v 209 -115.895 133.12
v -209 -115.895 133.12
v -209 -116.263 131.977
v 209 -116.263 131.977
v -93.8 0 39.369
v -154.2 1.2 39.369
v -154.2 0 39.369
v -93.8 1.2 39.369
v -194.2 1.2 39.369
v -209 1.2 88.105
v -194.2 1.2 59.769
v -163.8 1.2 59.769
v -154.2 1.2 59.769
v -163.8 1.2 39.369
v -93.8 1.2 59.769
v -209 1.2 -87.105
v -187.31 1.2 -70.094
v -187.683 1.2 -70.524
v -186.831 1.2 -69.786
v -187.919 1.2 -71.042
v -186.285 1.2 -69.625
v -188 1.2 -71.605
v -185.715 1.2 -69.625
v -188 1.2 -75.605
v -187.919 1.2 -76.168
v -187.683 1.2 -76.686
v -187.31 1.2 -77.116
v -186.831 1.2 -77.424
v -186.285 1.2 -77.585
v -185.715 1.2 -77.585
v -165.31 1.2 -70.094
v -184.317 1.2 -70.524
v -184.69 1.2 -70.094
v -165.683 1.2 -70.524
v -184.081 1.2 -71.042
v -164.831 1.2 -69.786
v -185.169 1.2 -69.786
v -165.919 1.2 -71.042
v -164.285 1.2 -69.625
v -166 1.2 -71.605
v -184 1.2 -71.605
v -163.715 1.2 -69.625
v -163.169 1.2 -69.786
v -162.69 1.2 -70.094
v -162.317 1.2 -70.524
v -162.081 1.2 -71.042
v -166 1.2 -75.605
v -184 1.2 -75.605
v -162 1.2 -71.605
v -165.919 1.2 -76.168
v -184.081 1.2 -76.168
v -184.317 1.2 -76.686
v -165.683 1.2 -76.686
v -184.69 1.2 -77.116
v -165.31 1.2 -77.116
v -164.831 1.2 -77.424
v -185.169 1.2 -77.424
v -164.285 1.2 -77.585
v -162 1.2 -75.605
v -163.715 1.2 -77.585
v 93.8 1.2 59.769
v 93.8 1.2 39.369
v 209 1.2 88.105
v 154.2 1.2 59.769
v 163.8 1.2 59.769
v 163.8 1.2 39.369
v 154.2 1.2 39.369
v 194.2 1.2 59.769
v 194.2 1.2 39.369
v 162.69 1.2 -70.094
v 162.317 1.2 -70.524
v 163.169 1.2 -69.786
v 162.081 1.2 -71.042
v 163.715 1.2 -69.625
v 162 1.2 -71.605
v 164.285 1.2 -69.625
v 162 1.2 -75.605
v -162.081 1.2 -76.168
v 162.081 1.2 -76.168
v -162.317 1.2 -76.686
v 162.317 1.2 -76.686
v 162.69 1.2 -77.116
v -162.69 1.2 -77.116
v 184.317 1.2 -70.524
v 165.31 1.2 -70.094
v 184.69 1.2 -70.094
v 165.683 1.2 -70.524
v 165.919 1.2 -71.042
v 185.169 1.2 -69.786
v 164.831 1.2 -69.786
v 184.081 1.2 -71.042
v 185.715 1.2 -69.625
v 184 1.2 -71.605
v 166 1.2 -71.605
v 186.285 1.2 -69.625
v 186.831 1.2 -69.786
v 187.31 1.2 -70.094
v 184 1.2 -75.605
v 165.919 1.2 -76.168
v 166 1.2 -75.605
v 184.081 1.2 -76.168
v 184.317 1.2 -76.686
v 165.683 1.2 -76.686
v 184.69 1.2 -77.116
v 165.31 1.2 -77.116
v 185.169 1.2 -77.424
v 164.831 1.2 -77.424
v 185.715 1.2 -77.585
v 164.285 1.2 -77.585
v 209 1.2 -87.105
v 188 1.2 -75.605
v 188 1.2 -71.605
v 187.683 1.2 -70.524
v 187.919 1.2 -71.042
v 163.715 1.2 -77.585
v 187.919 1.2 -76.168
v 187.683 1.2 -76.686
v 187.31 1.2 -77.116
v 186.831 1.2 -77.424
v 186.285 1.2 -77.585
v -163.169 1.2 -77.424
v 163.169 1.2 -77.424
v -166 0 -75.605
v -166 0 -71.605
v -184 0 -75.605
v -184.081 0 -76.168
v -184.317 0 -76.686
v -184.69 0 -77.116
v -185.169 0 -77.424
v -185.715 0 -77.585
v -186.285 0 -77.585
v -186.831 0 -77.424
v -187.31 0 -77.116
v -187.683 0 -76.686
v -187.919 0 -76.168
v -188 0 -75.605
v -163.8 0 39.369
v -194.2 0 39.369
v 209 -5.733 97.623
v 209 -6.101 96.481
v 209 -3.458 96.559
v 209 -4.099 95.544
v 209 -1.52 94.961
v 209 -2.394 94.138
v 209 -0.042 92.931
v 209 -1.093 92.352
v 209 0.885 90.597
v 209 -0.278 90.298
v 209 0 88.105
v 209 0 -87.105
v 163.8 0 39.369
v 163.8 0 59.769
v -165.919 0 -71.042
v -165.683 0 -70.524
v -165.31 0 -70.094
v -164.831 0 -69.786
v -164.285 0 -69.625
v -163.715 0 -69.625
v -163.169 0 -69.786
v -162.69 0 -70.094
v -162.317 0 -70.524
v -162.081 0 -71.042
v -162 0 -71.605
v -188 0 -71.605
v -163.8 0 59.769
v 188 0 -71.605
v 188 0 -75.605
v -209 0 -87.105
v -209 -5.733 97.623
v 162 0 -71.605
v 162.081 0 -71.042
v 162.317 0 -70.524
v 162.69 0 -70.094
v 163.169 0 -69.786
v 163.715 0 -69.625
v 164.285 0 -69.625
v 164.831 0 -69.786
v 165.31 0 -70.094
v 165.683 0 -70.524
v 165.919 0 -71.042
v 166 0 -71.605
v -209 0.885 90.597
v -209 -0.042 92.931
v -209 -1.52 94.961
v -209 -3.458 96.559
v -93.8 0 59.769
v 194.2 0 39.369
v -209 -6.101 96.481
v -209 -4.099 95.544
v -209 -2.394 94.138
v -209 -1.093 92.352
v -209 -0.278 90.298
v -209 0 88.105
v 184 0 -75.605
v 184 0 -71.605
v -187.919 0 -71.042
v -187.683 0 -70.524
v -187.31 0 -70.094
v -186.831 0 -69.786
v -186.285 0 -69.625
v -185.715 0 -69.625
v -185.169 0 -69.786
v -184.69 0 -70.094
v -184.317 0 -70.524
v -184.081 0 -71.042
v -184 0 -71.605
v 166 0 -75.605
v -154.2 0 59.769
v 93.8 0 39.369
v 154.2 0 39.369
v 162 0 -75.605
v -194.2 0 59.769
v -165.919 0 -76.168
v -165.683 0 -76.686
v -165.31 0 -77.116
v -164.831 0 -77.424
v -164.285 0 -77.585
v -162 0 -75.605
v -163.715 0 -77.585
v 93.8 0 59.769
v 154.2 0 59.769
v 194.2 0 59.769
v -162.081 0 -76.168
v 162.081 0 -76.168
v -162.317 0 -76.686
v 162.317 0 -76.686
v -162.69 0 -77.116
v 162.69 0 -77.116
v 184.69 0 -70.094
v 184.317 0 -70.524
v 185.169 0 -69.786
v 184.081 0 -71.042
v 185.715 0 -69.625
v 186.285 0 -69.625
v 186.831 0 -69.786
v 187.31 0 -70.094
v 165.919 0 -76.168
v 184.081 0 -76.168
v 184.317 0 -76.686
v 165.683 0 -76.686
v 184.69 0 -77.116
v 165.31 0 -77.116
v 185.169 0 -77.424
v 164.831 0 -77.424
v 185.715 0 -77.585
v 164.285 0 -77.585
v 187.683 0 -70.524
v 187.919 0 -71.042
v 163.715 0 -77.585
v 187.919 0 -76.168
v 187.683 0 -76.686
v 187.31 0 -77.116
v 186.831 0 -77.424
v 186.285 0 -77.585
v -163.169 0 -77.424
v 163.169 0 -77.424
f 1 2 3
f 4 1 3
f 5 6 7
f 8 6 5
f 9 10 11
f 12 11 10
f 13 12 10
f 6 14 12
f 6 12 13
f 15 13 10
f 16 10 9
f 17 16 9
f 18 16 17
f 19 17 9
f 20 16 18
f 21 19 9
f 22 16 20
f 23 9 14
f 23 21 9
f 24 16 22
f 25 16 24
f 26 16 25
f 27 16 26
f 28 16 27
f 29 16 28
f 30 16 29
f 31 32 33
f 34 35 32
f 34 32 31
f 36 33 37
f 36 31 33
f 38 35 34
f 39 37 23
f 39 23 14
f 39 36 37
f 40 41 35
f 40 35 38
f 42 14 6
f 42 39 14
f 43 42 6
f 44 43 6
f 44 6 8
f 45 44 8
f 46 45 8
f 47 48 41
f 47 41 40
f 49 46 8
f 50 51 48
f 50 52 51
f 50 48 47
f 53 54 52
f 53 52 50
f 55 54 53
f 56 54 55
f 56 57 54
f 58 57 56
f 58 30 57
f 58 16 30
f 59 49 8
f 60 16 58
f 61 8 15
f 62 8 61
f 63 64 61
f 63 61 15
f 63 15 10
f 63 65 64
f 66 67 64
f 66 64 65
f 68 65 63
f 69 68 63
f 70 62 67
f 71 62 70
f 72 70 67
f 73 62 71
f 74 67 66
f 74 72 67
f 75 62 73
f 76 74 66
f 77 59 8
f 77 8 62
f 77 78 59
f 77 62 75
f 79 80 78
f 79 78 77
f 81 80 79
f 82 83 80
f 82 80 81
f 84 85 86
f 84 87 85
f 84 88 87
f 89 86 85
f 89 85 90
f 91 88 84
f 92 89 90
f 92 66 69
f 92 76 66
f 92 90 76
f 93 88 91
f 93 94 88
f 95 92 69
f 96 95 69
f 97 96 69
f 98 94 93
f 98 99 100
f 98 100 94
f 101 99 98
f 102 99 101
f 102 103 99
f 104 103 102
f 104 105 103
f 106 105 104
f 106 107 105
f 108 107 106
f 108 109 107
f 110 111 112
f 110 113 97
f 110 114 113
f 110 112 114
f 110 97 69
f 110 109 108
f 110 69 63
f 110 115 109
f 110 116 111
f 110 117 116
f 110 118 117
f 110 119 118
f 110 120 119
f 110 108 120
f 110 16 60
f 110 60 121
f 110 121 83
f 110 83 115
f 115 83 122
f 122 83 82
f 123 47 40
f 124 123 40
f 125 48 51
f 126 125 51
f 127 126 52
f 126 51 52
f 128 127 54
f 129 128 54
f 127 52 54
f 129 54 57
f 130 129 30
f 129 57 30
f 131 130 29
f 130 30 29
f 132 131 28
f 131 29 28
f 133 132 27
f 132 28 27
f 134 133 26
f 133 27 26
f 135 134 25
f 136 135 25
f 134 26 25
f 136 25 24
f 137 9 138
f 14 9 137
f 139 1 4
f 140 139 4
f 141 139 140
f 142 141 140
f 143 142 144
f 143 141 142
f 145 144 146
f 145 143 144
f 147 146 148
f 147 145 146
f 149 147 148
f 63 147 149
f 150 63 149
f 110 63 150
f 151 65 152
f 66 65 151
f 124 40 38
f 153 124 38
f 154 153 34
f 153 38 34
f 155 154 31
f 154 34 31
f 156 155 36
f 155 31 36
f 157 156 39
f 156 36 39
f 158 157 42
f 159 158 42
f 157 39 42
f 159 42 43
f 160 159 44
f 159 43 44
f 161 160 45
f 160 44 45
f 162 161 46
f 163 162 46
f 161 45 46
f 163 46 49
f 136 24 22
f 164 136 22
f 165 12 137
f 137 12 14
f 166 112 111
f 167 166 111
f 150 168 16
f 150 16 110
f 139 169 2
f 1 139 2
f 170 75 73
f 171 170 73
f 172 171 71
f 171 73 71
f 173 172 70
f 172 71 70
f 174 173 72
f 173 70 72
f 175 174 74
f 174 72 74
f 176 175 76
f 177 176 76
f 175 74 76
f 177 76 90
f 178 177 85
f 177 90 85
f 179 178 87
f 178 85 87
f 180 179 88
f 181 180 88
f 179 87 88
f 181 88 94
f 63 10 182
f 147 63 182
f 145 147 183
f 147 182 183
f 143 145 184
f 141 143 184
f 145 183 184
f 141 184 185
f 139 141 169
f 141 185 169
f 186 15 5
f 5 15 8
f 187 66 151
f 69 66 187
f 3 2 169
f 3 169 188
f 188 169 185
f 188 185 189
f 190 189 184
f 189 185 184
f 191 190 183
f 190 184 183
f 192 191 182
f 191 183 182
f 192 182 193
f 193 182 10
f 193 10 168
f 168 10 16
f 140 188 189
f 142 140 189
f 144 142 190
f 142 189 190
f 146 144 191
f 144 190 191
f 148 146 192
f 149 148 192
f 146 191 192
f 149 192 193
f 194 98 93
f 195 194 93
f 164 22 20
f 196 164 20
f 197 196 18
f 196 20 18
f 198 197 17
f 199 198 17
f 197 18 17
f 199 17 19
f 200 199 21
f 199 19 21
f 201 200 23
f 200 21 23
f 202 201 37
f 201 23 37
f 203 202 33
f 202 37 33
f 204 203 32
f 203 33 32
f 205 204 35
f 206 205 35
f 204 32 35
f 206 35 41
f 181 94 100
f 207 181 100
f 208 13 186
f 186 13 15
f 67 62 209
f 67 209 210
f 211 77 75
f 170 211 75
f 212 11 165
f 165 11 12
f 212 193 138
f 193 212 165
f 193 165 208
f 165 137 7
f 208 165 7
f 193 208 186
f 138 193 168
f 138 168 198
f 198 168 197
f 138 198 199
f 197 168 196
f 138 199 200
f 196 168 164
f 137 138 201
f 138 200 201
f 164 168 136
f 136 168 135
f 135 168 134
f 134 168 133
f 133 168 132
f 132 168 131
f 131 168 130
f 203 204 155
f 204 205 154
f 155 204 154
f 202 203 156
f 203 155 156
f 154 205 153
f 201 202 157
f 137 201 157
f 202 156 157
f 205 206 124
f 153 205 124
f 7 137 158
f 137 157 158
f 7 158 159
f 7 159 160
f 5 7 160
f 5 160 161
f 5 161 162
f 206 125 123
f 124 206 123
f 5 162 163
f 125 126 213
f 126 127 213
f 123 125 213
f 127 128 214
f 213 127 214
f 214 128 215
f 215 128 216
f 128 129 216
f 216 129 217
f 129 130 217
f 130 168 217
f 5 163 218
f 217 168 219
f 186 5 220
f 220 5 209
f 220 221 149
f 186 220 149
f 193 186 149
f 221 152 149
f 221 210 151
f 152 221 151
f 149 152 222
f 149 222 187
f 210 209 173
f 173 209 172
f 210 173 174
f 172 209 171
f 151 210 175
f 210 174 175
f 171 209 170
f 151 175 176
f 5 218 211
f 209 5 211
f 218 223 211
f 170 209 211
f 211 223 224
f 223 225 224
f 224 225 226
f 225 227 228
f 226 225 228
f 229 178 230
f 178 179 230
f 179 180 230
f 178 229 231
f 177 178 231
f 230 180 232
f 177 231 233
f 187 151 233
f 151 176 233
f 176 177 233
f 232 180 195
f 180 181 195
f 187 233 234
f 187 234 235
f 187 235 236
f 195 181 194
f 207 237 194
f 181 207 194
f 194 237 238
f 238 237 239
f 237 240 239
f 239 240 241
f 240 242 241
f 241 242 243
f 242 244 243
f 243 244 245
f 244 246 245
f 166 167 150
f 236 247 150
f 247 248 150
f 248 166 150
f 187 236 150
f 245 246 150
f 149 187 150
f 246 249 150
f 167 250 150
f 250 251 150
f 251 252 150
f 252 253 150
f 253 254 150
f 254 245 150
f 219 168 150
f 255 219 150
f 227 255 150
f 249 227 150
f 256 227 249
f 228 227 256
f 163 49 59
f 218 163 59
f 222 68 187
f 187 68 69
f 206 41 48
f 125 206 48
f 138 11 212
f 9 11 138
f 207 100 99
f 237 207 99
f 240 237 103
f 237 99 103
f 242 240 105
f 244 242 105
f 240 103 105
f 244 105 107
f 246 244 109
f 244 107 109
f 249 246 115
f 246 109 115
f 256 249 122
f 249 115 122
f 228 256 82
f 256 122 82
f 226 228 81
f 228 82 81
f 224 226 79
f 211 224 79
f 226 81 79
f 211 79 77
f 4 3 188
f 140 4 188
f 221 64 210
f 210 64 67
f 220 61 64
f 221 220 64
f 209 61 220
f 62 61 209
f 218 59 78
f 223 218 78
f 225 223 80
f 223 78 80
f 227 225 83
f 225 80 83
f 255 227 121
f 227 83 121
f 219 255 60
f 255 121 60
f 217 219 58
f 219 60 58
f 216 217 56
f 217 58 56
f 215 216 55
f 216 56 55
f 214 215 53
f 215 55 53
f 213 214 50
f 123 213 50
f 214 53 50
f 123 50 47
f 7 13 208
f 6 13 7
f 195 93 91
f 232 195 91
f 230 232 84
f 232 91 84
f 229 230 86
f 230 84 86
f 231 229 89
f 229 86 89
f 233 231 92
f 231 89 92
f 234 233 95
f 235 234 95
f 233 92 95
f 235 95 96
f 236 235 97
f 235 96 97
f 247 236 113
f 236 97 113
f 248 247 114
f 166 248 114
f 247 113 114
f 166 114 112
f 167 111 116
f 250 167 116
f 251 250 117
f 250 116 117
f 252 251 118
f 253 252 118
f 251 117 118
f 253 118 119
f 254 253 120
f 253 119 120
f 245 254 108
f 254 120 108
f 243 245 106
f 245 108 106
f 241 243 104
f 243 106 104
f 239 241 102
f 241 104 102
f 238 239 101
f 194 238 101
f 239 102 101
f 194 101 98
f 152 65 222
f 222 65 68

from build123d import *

# Parameters (mm, degrees)
SKETCH_1_W           = 418
SKETCH_1_H           = 175.21
EXTRUDE_1_DEPTH      = 1.2
EXTRUDE_2_DEPTH      = 209
EXTRUDE_2_DEPTH_BACK = 209
SKETCH_3_R           = 2
CUT_EXTRUDE_1_DEPTH  = 1.2
CUT_EXTRUDE_2_REACH  = 281.994
SKETCH_4_R           = 3
CUT_EXTRUDE_3_REACH  = 276.225
SKETCH_7_W           = 30.4
SKETCH_7_H           = 20.4
SKETCH_7_W_2         = 60.4


with BuildPart() as part:
    # 스케치1 → 보스-돌출1 (new body)
    with BuildSketch(Plane(origin=(0, 0, 0), x_dir=(1, 0, 0), z_dir=(0, 1, 0))):
        with Locations((0, -0.5)):
            Rectangle(SKETCH_1_W, SKETCH_1_H)
    extrude(amount=EXTRUDE_1_DEPTH)

    # 스케치2 → 보스-돌출2 (add, two sides: drawn at the far end of the back side and taken through both)
    with BuildSketch(Plane(origin=(0, 0, 0), x_dir=(0, 0, -1), z_dir=(1, 0, 0)).offset(-EXTRUDE_2_DEPTH_BACK)):
        with BuildLine():
            Line((-97.623087474, -5.733077953), (-133.119643249, -115.895422372))
            Line((-133.119643249, -115.895422372), (-131.977472753, -116.263453018))
            Line((-131.977472753, -116.263453018), (-96.480916977, -6.101108598))
            ThreePointArc((-96.480916977, -6.101108598), (-93.286204284, -1.686975175), (-88.105, 0))
            Line((-88.105, 0), (-88.105, 1.2))
            ThreePointArc((-88.105, 1.2), (-93.992732141, -0.717017244), (-97.623087474, -5.733077953))
        make_face()
    extrude(amount=EXTRUDE_2_DEPTH + EXTRUDE_2_DEPTH_BACK)

    # 스케치3 → 컷-돌출1 (cut)
    with BuildSketch(Plane(origin=(0, 1.2, 0), x_dir=(1, 0, 0), z_dir=(0, 1, 0))):
        with Locations((-186, 71.605)):
            Circle(SKETCH_3_R)
        with Locations((-186, 73.605)):
            Circle(SKETCH_3_R)
        with Locations((-186, 75.605)):
            Circle(SKETCH_3_R)
        with BuildLine():
            ThreePointArc((-187.732050808, 74.605), (-187.931851653, 75.08736191), (-188, 75.605))
            Line((-188, 75.605), (-188, 73.605))
            ThreePointArc((-188, 73.605), (-187.931851653, 74.12263809), (-187.732050808, 74.605))
        make_face()
        with BuildLine():
            ThreePointArc((-187.732050808, 72.605), (-187.931851653, 73.08736191), (-188, 73.605))
            Line((-188, 73.605), (-188, 71.605))
            ThreePointArc((-188, 71.605), (-187.931851653, 72.12263809), (-187.732050808, 72.605))
        make_face()
        with BuildLine():
            Line((-184, 71.605), (-184, 73.605))
            ThreePointArc((-184, 73.605), (-184.068148347, 73.08736191), (-184.267949192, 72.605))
            ThreePointArc((-184.267949192, 72.605), (-184.068148347, 72.12263809), (-184, 71.605))
        make_face()
        with BuildLine():
            Line((-184, 73.605), (-184, 75.605))
            ThreePointArc((-184, 75.605), (-184.068148347, 75.08736191), (-184.267949192, 74.605))
            ThreePointArc((-184.267949192, 74.605), (-184.068148347, 74.12263809), (-184, 73.605))
        make_face()
        with Locations((-164, 73.605)):
            Circle(SKETCH_3_R)
        with Locations((-164, 75.605)):
            Circle(SKETCH_3_R)
        with Locations((-164, 71.605)):
            Circle(SKETCH_3_R)
        with BuildLine():
            ThreePointArc((-165.732050808, 72.605), (-165.931851653, 73.08736191), (-166, 73.605))
            Line((-166, 73.605), (-166, 71.605))
            ThreePointArc((-166, 71.605), (-165.931851653, 72.12263809), (-165.732050808, 72.605))
        make_face()
        with BuildLine():
            ThreePointArc((-165.732050808, 74.605), (-165.931851653, 75.08736191), (-166, 75.605))
            Line((-166, 75.605), (-166, 73.605))
            ThreePointArc((-166, 73.605), (-165.931851653, 74.12263809), (-165.732050808, 74.605))
        make_face()
        with BuildLine():
            Line((-162, 71.605), (-162, 73.605))
            ThreePointArc((-162, 73.605), (-162.068148347, 73.08736191), (-162.267949192, 72.605))
            ThreePointArc((-162.267949192, 72.605), (-162.068148347, 72.12263809), (-162, 71.605))
        make_face()
        with BuildLine():
            Line((-162, 73.605), (-162, 75.605))
            ThreePointArc((-162, 75.605), (-162.068148347, 75.08736191), (-162.267949192, 74.605))
            ThreePointArc((-162.267949192, 74.605), (-162.068148347, 74.12263809), (-162, 73.605))
        make_face()
        with Locations((164, 73.605)):
            Circle(SKETCH_3_R)
        with Locations((164, 71.605)):
            Circle(SKETCH_3_R)
        with Locations((164, 75.605)):
            Circle(SKETCH_3_R)
        with BuildLine():
            ThreePointArc((162.267949192, 74.605), (162.068148347, 75.08736191), (162, 75.605))
            Line((162, 75.605), (162, 73.605))
            ThreePointArc((162, 73.605), (162.068148347, 74.12263809), (162.267949192, 74.605))
        make_face()
        with BuildLine():
            ThreePointArc((162.267949192, 72.605), (162.068148347, 73.08736191), (162, 73.605))
            Line((162, 73.605), (162, 71.605))
            ThreePointArc((162, 71.605), (162.068148347, 72.12263809), (162.267949192, 72.605))
        make_face()
        with BuildLine():
            Line((166, 73.605), (166, 75.605))
            ThreePointArc((166, 75.605), (165.931851653, 75.08736191), (165.732050808, 74.605))
            ThreePointArc((165.732050808, 74.605), (165.931851653, 74.12263809), (166, 73.605))
        make_face()
        with BuildLine():
            Line((166, 71.605), (166, 73.605))
            ThreePointArc((166, 73.605), (165.931851653, 73.08736191), (165.732050808, 72.605))
            ThreePointArc((165.732050808, 72.605), (165.931851653, 72.12263809), (166, 71.605))
        make_face()
        with Locations((186, 71.605)):
            Circle(SKETCH_3_R)
        with Locations((186, 73.605)):
            Circle(SKETCH_3_R)
        with Locations((186, 75.605)):
            Circle(SKETCH_3_R)
        with BuildLine():
            ThreePointArc((184.267949192, 74.605), (184.068148347, 75.08736191), (184, 75.605))
            Line((184, 75.605), (184, 73.605))
            ThreePointArc((184, 73.605), (184.068148347, 74.12263809), (184.267949192, 74.605))
        make_face()
        with BuildLine():
            ThreePointArc((184.267949192, 72.605), (184.068148347, 73.08736191), (184, 73.605))
            Line((184, 73.605), (184, 71.605))
            ThreePointArc((184, 71.605), (184.068148347, 72.12263809), (184.267949192, 72.605))
        make_face()
        with BuildLine():
            Line((188, 73.605), (188, 75.605))
            ThreePointArc((188, 75.605), (187.931851653, 75.08736191), (187.732050808, 74.605))
            ThreePointArc((187.732050808, 74.605), (187.931851653, 74.12263809), (188, 73.605))
        make_face()
        with BuildLine():
            Line((188, 71.605), (188, 73.605))
            ThreePointArc((188, 73.605), (187.931851653, 73.08736191), (187.732050808, 72.605))
            ThreePointArc((187.732050808, 72.605), (187.931851653, 72.12263809), (188, 71.605))
        make_face()
    extrude(amount=-CUT_EXTRUDE_1_DEPTH, mode=Mode.SUBTRACT)

    # 컷-돌출2: up to this plane
    cut_extrude_2_end = Plane(origin=(0, 0, 0), z_dir=(0, -1, 0))
    # 스케치4 → 컷-돌출2 (cut, up to the surface)
    with BuildSketch(Plane(origin=(0, 17.417324386, 3.331984817), x_dir=(1, 0, 0), z_dir=(0, 0.9821890034564742, 0.18789561327816653)), mode=Mode.PRIVATE) as cut_extrude_2_sk1:
        with Locations(Location((-179, -48.460287414, 0), (0, 0, 270))):
            Circle(SKETCH_4_R)
    cut_extrude_2_tool1 = split(extrude(cut_extrude_2_sk1.sketch, amount=-CUT_EXTRUDE_2_REACH, mode=Mode.PRIVATE), bisect_by=cut_extrude_2_end, keep=Keep.BOTH, mode=Mode.PRIVATE)
    add(cut_extrude_2_tool1.solids().sort_by_distance((-179, 8.311849, 50.929146))[0], mode=Mode.SUBTRACT)
    # 스케치4 → 컷-돌출2 (cut, up to the surface)
    with BuildSketch(Plane(origin=(0, 17.417324386, 3.331984817), x_dir=(1, 0, 0), z_dir=(0, 0.9821890034564742, 0.18789561327816653)), mode=Mode.PRIVATE) as cut_extrude_2_sk2:
        with Locations(Location((-124, -48.460287414, 0), (0, 0, 270))):
            Circle(SKETCH_4_R)
    cut_extrude_2_tool2 = split(extrude(cut_extrude_2_sk2.sketch, amount=-CUT_EXTRUDE_2_REACH, mode=Mode.PRIVATE), bisect_by=cut_extrude_2_end, keep=Keep.BOTH, mode=Mode.PRIVATE)
    add(cut_extrude_2_tool2.solids().sort_by_distance((-124, 8.311849, 50.929146))[0], mode=Mode.SUBTRACT)
    # 스케치4 → 컷-돌출2 (cut, up to the surface)
    with BuildSketch(Plane(origin=(0, 17.417324386, 3.331984817), x_dir=(1, 0, 0), z_dir=(0, 0.9821890034564742, 0.18789561327816653)), mode=Mode.PRIVATE) as cut_extrude_2_sk3:
        with Locations(Location((124, -48.460287414, 0), (0, 0, 270))):
            Circle(SKETCH_4_R)
    cut_extrude_2_tool3 = split(extrude(cut_extrude_2_sk3.sketch, amount=-CUT_EXTRUDE_2_REACH, mode=Mode.PRIVATE), bisect_by=cut_extrude_2_end, keep=Keep.BOTH, mode=Mode.PRIVATE)
    add(cut_extrude_2_tool3.solids().sort_by_distance((124, 8.311849, 50.929146))[0], mode=Mode.SUBTRACT)
    # 스케치4 → 컷-돌출2 (cut, up to the surface)
    with BuildSketch(Plane(origin=(0, 17.417324386, 3.331984817), x_dir=(1, 0, 0), z_dir=(0, 0.9821890034564742, 0.18789561327816653)), mode=Mode.PRIVATE) as cut_extrude_2_sk4:
        with Locations(Location((179, -48.460287414, 0), (0, 0, 270))):
            Circle(SKETCH_4_R)
    cut_extrude_2_tool4 = split(extrude(cut_extrude_2_sk4.sketch, amount=-CUT_EXTRUDE_2_REACH, mode=Mode.PRIVATE), bisect_by=cut_extrude_2_end, keep=Keep.BOTH, mode=Mode.PRIVATE)
    add(cut_extrude_2_tool4.solids().sort_by_distance((179, 8.311849, 50.929146))[0], mode=Mode.SUBTRACT)

    # 스케치7 → 컷-돌출3 (cut, up to next)
    with BuildSketch(Plane(origin=(0, 1.2, 0), x_dir=(1, 0, 0), z_dir=(0, 1, 0)), mode=Mode.PRIVATE) as cut_extrude_3_sk1:
        with Locations((-179, -49.568628826)):
            Rectangle(SKETCH_7_W, SKETCH_7_H)
    cut_extrude_3_tool1 = extrude(cut_extrude_3_sk1.sketch, amount=-CUT_EXTRUDE_3_REACH, mode=Mode.PRIVATE) & part.part
    # 스케치7 → 컷-돌출3 (cut, up to next)
    with BuildSketch(Plane(origin=(0, 1.2, 0), x_dir=(1, 0, 0), z_dir=(0, 1, 0)), mode=Mode.PRIVATE) as cut_extrude_3_sk2:
        with Locations((-124, -49.568628826)):
            Rectangle(SKETCH_7_W_2, SKETCH_7_H)
    cut_extrude_3_tool2 = extrude(cut_extrude_3_sk2.sketch, amount=-CUT_EXTRUDE_3_REACH, mode=Mode.PRIVATE) & part.part
    # 스케치7 → 컷-돌출3 (cut, up to next)
    with BuildSketch(Plane(origin=(0, 1.2, 0), x_dir=(1, 0, 0), z_dir=(0, 1, 0)), mode=Mode.PRIVATE) as cut_extrude_3_sk3:
        with Locations((179, -49.568628826)):
            Rectangle(SKETCH_7_W, SKETCH_7_H)
    cut_extrude_3_tool3 = extrude(cut_extrude_3_sk3.sketch, amount=-CUT_EXTRUDE_3_REACH, mode=Mode.PRIVATE) & part.part
    # 스케치7 → 컷-돌출3 (cut, up to next)
    with BuildSketch(Plane(origin=(0, 1.2, 0), x_dir=(1, 0, 0), z_dir=(0, 1, 0)), mode=Mode.PRIVATE) as cut_extrude_3_sk4:
        with Locations((124, -49.568628826)):
            Rectangle(SKETCH_7_W_2, SKETCH_7_H)
    cut_extrude_3_tool4 = extrude(cut_extrude_3_sk4.sketch, amount=-CUT_EXTRUDE_3_REACH, mode=Mode.PRIVATE) & part.part
    add(cut_extrude_3_tool1.solids().sort_by_distance((-179, 1.2, 49.568629))[0], mode=Mode.SUBTRACT)
    add(cut_extrude_3_tool2.solids().sort_by_distance((-124, 1.2, 49.568629))[0], mode=Mode.SUBTRACT)
    add(cut_extrude_3_tool3.solids().sort_by_distance((179, 1.2, 49.568629))[0], mode=Mode.SUBTRACT)
    add(cut_extrude_3_tool4.solids().sort_by_distance((124, 1.2, 49.568629))[0], mode=Mode.SUBTRACT)


solid = part.part
